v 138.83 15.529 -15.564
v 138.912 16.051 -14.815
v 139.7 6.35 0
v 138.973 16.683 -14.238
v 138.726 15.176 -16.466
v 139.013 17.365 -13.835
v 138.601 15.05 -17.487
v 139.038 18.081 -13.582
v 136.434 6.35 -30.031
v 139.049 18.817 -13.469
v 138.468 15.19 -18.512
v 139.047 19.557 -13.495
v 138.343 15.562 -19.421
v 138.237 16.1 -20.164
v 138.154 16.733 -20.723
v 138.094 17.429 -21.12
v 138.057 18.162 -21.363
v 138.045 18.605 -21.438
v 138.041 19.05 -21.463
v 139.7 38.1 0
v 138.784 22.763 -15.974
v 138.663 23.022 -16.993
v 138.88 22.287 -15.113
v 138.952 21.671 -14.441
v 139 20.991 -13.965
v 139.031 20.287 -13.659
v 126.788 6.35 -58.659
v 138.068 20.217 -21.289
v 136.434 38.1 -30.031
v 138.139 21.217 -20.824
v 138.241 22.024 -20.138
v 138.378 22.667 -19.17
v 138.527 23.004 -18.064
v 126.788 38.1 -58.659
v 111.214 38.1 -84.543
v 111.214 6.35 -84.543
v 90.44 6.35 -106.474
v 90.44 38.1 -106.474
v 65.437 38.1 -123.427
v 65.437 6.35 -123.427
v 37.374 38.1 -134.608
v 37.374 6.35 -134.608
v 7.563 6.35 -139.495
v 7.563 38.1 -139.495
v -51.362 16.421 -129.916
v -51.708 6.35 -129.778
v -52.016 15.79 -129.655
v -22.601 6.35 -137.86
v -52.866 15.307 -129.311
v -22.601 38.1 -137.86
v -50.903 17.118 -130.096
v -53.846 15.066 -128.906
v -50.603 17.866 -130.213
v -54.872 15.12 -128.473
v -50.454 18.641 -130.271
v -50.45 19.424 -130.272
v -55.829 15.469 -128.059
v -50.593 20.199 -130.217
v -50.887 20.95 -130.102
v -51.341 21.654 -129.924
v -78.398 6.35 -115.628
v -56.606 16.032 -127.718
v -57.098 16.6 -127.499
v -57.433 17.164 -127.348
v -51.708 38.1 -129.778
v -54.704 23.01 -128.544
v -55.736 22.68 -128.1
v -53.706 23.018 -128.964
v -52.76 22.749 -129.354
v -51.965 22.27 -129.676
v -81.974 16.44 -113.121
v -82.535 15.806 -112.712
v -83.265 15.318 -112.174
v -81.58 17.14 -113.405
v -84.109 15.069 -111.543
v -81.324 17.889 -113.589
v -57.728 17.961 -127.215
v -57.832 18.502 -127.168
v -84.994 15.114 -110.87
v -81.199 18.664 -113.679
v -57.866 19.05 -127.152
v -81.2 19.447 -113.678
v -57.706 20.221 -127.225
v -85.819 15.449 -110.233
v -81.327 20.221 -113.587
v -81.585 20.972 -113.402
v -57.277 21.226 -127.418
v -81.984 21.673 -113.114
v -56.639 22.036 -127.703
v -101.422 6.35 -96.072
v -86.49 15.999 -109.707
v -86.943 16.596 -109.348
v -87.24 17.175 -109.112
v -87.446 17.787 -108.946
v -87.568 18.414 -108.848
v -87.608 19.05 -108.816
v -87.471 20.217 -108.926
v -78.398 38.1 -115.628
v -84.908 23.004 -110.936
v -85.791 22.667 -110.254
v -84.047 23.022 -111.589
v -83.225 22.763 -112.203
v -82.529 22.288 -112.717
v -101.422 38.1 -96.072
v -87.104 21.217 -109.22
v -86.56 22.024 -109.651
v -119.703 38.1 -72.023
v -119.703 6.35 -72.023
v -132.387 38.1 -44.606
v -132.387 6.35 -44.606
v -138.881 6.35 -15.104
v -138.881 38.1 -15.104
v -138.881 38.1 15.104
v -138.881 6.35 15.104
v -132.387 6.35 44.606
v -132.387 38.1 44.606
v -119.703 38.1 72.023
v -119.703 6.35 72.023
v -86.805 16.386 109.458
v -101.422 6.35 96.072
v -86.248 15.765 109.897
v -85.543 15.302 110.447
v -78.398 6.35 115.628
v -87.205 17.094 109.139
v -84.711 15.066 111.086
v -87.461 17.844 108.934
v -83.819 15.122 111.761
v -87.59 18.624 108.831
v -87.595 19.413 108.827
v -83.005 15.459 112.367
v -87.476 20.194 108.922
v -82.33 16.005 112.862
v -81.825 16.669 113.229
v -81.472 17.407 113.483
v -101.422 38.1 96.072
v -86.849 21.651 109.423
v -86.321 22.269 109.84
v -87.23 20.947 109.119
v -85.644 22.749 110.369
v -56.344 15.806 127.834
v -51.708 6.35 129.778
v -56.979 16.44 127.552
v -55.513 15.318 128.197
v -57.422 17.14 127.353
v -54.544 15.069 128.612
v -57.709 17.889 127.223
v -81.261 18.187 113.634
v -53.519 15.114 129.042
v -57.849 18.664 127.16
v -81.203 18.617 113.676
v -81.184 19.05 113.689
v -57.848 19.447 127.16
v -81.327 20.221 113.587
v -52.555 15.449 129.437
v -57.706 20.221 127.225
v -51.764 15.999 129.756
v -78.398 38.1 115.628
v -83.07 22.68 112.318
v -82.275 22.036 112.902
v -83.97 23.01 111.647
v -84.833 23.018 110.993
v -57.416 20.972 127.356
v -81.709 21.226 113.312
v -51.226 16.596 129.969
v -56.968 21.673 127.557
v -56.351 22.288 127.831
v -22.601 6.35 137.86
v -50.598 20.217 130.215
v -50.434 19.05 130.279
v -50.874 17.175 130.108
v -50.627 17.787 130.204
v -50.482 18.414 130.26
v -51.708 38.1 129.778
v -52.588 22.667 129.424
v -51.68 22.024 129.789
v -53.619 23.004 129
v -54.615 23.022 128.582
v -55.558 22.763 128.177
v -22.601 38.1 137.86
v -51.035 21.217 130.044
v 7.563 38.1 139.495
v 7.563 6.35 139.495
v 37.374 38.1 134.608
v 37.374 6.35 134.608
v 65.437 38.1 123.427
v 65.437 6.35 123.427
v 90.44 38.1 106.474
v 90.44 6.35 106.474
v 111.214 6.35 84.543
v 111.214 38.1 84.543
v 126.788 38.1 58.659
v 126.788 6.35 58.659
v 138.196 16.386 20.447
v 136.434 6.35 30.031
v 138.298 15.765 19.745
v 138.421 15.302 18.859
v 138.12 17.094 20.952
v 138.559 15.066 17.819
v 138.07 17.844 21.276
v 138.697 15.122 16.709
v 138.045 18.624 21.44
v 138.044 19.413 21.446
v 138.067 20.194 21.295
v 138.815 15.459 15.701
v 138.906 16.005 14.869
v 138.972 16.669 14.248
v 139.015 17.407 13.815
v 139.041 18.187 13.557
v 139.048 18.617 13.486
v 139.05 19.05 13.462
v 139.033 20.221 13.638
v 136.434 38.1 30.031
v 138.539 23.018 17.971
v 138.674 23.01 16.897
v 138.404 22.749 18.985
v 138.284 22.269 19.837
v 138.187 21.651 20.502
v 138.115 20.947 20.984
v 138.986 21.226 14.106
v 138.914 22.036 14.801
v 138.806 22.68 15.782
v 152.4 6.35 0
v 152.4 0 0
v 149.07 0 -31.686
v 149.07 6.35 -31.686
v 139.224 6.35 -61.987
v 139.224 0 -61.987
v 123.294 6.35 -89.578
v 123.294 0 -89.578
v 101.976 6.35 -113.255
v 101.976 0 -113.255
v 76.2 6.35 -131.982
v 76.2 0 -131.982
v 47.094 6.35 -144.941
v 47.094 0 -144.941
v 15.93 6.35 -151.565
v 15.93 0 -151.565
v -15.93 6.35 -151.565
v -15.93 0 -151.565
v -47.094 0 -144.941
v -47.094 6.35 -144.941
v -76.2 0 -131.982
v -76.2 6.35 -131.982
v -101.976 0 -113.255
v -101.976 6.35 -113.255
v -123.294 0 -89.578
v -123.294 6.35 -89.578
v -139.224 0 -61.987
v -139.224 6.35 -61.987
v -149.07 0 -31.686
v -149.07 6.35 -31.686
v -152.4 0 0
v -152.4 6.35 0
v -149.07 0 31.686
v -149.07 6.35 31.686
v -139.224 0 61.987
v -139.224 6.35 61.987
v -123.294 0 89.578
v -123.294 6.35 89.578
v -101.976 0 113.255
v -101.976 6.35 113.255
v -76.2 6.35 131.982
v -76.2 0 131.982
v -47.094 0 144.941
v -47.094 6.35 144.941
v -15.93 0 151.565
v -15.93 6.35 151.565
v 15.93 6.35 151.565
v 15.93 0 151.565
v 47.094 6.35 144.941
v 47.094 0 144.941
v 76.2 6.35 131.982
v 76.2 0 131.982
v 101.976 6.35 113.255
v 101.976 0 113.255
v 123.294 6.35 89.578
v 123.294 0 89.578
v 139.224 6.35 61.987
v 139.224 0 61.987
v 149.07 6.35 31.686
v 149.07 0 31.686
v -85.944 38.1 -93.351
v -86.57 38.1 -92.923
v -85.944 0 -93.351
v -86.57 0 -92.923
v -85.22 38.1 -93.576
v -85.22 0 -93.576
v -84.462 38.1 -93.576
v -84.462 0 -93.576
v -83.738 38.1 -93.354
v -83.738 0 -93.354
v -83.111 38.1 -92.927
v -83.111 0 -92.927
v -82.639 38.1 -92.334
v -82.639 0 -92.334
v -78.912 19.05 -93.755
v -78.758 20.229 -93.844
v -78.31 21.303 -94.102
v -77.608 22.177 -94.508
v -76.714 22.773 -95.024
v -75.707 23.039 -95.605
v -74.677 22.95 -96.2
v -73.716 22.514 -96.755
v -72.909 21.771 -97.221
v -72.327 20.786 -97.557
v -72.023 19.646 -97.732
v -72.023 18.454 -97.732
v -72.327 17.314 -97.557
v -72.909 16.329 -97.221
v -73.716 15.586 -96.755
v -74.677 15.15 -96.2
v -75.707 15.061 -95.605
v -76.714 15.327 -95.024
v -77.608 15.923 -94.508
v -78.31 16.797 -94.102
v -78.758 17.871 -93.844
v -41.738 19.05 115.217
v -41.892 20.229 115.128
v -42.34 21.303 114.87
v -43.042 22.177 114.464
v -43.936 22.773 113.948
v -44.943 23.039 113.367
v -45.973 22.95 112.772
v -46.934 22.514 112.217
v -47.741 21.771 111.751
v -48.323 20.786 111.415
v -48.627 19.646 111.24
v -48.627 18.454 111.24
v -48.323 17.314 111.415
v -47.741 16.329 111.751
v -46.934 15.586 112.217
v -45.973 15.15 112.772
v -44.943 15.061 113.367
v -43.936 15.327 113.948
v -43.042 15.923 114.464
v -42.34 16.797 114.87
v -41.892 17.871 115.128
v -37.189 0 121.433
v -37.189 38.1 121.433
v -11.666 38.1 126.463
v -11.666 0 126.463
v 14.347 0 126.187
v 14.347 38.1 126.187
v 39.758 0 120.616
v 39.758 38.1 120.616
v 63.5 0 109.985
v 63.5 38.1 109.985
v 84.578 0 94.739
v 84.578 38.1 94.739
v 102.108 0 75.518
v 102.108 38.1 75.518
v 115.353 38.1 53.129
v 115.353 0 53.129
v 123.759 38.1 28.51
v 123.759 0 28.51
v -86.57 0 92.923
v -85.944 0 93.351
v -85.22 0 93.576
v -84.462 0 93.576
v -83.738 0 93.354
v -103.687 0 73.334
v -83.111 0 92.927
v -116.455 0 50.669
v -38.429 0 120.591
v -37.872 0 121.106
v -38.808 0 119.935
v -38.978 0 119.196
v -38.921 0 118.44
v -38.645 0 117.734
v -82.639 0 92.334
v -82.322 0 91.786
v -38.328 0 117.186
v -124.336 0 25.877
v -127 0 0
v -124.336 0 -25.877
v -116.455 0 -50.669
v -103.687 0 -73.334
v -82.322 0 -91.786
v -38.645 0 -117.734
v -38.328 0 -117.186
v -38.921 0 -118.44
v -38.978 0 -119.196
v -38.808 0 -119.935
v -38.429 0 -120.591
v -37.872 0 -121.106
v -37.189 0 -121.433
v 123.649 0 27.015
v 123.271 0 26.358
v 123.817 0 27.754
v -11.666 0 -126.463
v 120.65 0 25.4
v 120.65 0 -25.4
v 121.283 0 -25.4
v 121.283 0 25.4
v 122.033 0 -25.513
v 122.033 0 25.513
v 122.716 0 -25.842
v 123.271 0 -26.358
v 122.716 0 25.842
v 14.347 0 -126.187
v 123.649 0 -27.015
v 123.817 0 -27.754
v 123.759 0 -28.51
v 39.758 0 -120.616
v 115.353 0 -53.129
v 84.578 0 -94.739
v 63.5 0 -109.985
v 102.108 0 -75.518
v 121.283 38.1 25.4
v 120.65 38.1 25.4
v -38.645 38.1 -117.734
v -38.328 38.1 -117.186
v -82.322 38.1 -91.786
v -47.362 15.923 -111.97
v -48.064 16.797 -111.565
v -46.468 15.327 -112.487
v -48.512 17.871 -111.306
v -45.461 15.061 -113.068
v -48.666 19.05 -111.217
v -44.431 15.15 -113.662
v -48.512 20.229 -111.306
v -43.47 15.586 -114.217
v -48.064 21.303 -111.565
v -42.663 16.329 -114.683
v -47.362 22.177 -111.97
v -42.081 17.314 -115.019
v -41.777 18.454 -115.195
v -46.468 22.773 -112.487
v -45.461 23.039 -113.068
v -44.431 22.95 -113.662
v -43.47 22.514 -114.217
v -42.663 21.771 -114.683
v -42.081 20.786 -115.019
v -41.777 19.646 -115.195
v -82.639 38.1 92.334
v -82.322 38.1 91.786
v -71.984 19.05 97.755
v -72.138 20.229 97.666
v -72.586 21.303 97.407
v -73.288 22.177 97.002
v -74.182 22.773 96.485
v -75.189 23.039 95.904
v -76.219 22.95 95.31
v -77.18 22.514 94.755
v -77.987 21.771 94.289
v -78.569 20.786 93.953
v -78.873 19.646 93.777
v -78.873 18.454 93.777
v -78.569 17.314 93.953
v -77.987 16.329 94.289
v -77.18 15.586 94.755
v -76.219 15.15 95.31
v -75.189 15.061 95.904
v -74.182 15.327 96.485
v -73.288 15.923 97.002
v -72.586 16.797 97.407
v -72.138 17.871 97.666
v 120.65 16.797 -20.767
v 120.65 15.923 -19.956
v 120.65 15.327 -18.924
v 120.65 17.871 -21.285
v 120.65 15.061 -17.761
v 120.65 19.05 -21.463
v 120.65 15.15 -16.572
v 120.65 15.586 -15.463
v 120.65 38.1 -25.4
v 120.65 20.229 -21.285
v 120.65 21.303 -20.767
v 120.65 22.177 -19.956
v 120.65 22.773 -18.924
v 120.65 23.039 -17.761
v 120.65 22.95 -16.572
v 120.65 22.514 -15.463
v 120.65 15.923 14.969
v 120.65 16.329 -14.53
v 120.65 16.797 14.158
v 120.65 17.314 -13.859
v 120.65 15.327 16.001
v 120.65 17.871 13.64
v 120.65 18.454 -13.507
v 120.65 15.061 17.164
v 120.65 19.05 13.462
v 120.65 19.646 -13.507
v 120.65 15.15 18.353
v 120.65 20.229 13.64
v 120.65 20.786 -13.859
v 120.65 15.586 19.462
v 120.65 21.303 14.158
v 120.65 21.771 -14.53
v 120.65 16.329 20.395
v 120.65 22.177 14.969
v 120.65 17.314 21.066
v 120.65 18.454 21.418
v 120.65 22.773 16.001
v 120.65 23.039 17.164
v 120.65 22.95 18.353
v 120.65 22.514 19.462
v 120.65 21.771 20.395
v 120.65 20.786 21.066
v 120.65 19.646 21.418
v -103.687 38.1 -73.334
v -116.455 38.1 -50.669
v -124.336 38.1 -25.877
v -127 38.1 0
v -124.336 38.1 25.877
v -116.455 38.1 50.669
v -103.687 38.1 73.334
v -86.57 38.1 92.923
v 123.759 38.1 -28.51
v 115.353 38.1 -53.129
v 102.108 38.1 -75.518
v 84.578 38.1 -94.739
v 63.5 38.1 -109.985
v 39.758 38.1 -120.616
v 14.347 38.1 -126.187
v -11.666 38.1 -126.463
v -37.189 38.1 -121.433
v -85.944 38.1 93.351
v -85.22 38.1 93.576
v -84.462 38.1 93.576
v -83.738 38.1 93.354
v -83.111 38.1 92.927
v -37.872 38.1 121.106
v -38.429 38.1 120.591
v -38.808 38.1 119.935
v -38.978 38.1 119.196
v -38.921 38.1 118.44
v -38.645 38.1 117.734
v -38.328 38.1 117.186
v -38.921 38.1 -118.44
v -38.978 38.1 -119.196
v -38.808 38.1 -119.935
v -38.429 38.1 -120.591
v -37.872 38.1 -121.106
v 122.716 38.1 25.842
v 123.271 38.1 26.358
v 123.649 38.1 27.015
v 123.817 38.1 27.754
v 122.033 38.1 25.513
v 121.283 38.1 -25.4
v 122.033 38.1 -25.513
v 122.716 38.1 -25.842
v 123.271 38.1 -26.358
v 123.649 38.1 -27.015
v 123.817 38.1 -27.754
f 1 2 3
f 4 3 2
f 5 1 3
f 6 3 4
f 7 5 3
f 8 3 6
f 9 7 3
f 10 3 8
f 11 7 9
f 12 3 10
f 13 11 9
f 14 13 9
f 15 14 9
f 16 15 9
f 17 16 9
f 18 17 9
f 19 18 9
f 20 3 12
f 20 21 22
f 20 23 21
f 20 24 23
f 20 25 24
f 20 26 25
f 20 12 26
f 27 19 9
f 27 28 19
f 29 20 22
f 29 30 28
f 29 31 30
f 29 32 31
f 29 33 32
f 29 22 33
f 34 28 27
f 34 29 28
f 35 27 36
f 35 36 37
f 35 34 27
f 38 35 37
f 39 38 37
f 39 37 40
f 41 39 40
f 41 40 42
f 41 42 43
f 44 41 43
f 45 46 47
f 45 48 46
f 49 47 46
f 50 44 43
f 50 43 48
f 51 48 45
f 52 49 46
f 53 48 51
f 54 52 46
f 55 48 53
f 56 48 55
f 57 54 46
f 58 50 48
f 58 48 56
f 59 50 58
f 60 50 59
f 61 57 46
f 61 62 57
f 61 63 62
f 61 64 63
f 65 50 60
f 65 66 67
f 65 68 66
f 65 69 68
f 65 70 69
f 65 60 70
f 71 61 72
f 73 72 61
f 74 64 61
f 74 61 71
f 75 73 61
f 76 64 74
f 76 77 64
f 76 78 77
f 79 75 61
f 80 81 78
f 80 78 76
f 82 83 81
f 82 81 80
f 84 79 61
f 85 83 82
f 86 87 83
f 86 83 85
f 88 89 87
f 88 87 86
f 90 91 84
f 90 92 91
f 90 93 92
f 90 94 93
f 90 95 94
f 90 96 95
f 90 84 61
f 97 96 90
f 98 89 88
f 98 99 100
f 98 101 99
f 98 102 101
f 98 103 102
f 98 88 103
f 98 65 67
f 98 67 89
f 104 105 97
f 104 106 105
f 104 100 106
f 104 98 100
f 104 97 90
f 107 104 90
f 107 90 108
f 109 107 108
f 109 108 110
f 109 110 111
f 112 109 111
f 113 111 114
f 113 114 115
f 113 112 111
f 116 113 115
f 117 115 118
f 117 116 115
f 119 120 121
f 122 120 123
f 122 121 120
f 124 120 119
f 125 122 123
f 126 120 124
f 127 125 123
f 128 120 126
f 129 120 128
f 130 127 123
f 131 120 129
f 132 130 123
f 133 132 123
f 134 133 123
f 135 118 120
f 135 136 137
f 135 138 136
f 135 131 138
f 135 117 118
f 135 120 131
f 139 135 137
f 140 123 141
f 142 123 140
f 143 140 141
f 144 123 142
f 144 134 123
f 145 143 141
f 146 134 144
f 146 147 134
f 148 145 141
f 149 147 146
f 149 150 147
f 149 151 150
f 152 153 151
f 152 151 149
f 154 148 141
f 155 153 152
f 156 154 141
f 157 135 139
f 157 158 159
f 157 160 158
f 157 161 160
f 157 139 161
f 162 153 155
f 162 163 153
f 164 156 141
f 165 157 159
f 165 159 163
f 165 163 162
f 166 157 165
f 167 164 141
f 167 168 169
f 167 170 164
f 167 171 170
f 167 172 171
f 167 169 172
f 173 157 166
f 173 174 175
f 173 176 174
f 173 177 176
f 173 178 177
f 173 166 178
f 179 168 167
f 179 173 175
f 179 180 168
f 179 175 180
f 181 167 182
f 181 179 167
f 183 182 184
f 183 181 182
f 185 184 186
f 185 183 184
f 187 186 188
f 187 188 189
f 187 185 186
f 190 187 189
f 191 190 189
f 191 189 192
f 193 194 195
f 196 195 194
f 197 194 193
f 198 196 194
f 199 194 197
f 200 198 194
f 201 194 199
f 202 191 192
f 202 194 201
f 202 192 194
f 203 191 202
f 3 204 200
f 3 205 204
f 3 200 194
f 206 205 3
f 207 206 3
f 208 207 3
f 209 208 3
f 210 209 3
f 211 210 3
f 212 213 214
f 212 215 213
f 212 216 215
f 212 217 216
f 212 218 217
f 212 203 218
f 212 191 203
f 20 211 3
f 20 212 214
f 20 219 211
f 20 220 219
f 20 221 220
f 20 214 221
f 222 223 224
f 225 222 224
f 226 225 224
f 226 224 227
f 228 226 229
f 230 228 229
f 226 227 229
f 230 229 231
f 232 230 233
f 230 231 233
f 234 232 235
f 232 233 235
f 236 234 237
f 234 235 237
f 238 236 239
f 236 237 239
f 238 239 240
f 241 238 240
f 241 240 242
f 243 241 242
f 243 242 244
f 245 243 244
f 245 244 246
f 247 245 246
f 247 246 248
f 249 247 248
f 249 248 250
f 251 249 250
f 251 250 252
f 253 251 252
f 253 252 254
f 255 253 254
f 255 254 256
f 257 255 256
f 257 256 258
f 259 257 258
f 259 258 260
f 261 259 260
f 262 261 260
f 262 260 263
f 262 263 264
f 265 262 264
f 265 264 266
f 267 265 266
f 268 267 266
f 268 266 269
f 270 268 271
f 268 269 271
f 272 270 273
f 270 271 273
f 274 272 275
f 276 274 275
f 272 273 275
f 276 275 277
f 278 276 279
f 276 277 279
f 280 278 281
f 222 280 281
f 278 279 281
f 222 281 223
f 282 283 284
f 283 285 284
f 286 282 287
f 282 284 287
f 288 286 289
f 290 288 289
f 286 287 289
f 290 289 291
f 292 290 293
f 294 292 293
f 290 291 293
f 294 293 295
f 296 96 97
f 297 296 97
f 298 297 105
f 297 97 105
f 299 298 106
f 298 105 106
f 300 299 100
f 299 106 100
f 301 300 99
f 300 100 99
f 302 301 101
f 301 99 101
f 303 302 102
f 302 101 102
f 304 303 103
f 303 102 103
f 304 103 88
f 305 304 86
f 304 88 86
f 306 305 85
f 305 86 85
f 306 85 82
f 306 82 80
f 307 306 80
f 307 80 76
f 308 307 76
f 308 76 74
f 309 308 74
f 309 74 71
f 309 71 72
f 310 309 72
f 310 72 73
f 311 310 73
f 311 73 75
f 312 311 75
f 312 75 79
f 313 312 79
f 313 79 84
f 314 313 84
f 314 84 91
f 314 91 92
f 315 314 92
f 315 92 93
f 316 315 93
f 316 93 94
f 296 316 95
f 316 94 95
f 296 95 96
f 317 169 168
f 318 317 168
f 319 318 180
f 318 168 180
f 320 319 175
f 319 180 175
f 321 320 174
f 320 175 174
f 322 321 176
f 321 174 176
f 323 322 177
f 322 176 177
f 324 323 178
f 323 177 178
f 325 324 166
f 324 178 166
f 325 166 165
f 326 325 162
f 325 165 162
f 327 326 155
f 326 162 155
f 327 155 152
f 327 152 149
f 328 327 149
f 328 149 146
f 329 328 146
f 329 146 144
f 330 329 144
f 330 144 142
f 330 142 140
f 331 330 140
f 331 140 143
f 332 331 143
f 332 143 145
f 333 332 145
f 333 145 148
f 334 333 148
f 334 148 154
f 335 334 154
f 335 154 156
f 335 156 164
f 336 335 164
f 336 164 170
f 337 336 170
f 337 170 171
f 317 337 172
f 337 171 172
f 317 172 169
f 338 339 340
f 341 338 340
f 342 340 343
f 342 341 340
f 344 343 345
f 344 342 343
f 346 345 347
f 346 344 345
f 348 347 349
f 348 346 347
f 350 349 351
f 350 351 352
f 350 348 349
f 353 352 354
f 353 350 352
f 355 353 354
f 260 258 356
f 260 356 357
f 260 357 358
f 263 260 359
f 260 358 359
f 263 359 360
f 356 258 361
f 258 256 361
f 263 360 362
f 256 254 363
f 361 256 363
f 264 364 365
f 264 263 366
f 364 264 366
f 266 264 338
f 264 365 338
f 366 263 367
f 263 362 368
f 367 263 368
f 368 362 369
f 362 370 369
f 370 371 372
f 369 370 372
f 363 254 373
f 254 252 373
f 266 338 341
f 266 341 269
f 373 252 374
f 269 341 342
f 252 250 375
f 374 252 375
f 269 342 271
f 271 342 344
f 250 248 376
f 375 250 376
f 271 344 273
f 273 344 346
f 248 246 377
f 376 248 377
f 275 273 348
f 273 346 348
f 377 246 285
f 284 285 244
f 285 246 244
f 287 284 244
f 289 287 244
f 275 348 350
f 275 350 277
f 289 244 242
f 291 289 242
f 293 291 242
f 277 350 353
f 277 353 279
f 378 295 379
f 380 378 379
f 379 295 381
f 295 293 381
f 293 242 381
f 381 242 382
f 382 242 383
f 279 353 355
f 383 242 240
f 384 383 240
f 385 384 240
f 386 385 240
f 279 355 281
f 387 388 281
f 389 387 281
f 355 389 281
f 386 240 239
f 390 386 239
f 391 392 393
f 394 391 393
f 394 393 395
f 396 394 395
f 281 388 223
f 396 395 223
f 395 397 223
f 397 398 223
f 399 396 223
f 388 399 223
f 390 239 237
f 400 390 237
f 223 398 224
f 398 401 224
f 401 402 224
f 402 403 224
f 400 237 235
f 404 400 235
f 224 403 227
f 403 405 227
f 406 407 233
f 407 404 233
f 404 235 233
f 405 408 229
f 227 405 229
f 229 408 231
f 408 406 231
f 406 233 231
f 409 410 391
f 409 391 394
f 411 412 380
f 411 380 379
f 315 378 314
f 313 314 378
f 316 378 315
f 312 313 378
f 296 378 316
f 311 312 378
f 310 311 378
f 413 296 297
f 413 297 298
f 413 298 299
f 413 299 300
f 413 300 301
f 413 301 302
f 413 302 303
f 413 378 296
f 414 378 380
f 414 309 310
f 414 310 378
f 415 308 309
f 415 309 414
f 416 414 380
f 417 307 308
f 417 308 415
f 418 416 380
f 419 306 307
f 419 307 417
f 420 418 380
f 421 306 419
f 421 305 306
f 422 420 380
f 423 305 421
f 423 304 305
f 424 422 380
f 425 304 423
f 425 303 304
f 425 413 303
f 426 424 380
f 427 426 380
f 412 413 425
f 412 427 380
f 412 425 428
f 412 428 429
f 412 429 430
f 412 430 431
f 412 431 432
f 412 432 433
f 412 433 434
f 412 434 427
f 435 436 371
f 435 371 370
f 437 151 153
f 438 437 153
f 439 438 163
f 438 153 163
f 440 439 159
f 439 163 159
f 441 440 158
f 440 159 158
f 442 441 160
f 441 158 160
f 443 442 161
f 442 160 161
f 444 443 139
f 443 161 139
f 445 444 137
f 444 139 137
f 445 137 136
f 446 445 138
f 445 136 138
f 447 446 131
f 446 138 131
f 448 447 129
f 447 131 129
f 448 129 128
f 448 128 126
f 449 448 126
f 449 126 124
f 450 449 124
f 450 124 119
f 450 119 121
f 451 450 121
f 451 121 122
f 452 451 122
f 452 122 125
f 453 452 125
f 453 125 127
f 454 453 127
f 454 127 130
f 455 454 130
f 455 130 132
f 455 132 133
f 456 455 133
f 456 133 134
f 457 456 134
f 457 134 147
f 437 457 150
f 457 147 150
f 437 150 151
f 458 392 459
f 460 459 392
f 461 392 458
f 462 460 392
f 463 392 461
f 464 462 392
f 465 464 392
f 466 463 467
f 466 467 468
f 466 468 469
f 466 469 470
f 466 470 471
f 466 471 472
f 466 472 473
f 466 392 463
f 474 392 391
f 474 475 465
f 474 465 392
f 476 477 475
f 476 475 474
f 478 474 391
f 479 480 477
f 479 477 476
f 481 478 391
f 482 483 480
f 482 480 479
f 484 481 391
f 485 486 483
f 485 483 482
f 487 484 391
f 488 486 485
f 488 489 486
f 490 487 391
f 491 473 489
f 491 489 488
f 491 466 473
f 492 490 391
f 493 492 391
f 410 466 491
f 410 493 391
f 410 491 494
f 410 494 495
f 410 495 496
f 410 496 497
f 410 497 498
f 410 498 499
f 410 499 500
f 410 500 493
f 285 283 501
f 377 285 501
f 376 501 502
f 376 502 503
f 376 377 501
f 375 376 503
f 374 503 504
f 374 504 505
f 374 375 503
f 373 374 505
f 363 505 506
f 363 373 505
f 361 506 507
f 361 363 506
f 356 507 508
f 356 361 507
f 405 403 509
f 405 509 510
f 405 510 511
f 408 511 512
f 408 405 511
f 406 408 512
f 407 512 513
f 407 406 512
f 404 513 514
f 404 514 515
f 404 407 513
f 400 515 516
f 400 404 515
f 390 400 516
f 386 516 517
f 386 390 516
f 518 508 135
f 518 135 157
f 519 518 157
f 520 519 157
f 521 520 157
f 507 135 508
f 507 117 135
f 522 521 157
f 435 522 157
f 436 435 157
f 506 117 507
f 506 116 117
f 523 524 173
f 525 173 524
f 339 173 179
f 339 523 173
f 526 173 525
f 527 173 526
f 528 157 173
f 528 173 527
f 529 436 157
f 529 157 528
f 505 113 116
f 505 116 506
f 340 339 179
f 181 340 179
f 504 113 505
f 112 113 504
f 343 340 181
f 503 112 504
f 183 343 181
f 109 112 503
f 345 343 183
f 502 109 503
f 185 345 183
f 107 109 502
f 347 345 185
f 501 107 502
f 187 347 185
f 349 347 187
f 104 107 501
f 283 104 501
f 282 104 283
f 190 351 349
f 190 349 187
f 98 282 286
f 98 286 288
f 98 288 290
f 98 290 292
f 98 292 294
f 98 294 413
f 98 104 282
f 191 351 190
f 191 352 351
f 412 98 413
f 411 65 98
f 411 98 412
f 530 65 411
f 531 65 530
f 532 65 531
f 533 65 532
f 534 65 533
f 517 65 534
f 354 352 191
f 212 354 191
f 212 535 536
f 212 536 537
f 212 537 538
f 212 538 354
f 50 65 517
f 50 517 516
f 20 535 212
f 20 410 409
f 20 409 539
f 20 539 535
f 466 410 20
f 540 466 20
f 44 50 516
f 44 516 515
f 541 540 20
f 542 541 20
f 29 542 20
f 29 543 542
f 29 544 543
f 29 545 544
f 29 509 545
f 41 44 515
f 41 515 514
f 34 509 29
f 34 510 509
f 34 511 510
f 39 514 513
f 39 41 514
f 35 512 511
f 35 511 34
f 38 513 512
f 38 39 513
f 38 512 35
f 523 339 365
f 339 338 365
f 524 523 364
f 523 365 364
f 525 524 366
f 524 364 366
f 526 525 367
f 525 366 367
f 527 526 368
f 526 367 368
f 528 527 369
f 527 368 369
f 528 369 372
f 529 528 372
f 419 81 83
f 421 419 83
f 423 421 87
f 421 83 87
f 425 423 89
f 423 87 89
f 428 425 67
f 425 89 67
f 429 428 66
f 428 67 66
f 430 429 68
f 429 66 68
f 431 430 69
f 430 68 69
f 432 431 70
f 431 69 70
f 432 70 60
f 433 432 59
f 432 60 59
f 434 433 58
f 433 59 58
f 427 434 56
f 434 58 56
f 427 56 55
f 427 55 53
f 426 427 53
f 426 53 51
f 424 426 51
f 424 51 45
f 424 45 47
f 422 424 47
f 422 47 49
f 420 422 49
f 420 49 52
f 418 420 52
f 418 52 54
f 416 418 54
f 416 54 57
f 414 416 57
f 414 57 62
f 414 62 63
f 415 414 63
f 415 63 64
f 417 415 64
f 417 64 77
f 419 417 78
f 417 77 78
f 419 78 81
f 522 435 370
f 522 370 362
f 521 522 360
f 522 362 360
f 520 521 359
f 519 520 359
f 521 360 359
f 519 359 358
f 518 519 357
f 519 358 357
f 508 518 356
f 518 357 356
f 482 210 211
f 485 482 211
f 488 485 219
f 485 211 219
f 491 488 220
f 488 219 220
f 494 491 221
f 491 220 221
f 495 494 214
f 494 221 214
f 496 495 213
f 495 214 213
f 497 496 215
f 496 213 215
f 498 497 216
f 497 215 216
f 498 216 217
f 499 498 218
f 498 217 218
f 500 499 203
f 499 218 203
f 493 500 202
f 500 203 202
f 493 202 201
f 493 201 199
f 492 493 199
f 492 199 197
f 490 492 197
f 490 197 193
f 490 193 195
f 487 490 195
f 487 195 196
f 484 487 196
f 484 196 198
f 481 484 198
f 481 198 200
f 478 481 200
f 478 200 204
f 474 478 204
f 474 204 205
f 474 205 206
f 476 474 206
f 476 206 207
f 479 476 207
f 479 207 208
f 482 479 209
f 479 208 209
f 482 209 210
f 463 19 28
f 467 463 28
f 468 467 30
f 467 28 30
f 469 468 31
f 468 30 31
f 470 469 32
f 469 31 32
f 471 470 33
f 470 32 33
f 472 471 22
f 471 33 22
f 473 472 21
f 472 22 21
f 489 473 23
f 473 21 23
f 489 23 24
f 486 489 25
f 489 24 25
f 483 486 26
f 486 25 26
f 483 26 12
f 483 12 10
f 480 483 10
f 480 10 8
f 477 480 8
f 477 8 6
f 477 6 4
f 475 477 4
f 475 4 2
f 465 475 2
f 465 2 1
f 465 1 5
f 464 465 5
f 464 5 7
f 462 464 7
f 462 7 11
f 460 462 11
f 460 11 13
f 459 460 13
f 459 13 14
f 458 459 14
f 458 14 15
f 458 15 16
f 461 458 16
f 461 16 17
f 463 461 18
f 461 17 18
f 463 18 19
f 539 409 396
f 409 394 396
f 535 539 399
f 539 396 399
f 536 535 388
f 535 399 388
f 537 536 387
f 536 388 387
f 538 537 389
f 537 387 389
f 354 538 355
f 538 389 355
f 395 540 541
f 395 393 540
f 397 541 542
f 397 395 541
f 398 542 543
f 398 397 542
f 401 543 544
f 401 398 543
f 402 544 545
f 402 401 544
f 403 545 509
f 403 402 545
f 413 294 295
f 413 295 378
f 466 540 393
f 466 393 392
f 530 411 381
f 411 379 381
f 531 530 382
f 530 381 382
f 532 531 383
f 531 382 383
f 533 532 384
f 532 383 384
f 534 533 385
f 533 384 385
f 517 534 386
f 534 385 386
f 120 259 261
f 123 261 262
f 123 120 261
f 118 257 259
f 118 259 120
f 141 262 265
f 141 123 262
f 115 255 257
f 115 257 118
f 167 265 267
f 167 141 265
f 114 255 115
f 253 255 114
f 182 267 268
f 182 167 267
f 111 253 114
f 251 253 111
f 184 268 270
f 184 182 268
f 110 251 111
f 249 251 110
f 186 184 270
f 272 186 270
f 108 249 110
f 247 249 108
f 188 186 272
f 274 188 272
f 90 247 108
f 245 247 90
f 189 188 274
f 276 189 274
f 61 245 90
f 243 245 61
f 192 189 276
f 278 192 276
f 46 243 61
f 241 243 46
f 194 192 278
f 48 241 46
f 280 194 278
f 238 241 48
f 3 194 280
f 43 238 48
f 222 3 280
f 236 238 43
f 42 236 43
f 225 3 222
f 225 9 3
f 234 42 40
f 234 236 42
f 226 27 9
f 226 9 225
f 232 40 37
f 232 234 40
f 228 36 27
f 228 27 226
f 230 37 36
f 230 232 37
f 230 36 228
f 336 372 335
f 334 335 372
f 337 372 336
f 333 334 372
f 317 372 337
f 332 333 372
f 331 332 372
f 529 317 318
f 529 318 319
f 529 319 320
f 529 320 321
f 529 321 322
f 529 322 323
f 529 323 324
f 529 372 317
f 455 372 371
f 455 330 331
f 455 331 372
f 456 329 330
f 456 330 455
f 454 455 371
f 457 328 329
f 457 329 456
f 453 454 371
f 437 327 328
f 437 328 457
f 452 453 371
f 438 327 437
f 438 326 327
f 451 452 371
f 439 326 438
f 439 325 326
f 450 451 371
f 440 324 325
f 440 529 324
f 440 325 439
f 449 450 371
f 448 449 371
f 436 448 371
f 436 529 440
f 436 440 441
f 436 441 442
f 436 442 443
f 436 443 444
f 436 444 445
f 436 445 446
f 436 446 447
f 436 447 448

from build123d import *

# Parameters (mm, degrees)
SKETCH1_R                = 152.4
SKETCH1_R_2              = 127
BOSS_EXTRUDE1_DEPTH      = 38.1
SKETCH2_R                = 152.4
SKETCH2_R_2              = 139.7
CUT_EXTRUDE1_DEPTH       = 31.75
BOSS_EXTRUDE2_DEPTH      = 38.1
FILLET1_R                = 2.54
HOLE1_D                  = 8
HOLE1_DEPTH              = 87.532271537
CIRPATTERN1_COUNT        = 3
FILLET1_OF_CIRPATTERN1_R = 2.54


with BuildPart() as part:
    # Sketch1 → Boss-Extrude1 (new body)
    with BuildSketch(Plane(origin=(0, 0, 0), x_dir=(1, 0, 0), z_dir=(0, 1, 0))):
        Circle(SKETCH1_R)
        Circle(SKETCH1_R_2, mode=Mode.SUBTRACT)
    extrude(amount=BOSS_EXTRUDE1_DEPTH)

    # Sketch2 → Cut-Extrude1 (cut)
    with BuildSketch(Plane(origin=(0, 38.1, 0), x_dir=(1, 0, 0), z_dir=(0, 1, 0))):
        Circle(SKETCH2_R)
        Circle(SKETCH2_R_2, mode=Mode.SUBTRACT)
    extrude(amount=-CUT_EXTRUDE1_DEPTH, mode=Mode.SUBTRACT)

    # Sketch3 → Boss-Extrude2 (add, through all)
    with BuildSketch(Plane(origin=(0, 38.1, 0), x_dir=(1, 0, 0), z_dir=(0, 1, 0))):
        with BuildLine():
            Line((120.65, 25.4), (120.65, -25.4))
            Line((120.65, -25.4), (124.434078933, -25.4))
            ThreePointArc((124.434078933, -25.4), (127, 0), (124.434078933, 25.4))
            Line((124.434078933, 25.4), (120.65, 25.4))
        make_face()
    boss_extrude2 = extrude(amount=-BOSS_EXTRUDE2_DEPTH)

    # Fillet1
    fillet1_edges = [part.edges().sort_by_distance(p)[0] for p in [
        (124.434078933, 19.05, -25.4),
        (124.434078933, 19.05, 25.4),
    ]]
    fillet(fillet1_edges, radius=FILLET1_R)

    # Hole1
    with Locations(Plane(origin=(120.65, 0, -417.943859866), x_dir=(0, 0, 1), z_dir=(-1, 0, 0))):
        with Locations((400.481359866, 19.05), (435.406359866, 19.05)):
            hole1 = Hole(HOLE1_D / 2, depth=HOLE1_DEPTH)

    # CirPattern1: Boss-Extrude2, Hole1 ×3 about axis
    cirpattern1_axis = Axis((0, 0, 0), (0, 1, 0))
    for i in range(1, CIRPATTERN1_COUNT):
        add(boss_extrude2.rotate(cirpattern1_axis, i * 360 / CIRPATTERN1_COUNT))
        add(hole1.rotate(cirpattern1_axis, i * 360 / CIRPATTERN1_COUNT), mode=Mode.SUBTRACT)

    # Fillet1 of CirPattern1
    fillet1_of_cirpattern1_edges = [part.edges().sort_by_distance(p)[0] for p in [
        (-84.214084723, 19.05, -95.063073453),
        (-40.219994211, 19.05, -120.463073453),
        (-40.219994211, 19.05, 120.463073453),
        (-84.214084723, 19.05, 95.063073453),
    ]]
    fillet(fillet1_of_cirpattern1_edges, radius=FILLET1_OF_CIRPATTERN1_R)


solid = part.part
